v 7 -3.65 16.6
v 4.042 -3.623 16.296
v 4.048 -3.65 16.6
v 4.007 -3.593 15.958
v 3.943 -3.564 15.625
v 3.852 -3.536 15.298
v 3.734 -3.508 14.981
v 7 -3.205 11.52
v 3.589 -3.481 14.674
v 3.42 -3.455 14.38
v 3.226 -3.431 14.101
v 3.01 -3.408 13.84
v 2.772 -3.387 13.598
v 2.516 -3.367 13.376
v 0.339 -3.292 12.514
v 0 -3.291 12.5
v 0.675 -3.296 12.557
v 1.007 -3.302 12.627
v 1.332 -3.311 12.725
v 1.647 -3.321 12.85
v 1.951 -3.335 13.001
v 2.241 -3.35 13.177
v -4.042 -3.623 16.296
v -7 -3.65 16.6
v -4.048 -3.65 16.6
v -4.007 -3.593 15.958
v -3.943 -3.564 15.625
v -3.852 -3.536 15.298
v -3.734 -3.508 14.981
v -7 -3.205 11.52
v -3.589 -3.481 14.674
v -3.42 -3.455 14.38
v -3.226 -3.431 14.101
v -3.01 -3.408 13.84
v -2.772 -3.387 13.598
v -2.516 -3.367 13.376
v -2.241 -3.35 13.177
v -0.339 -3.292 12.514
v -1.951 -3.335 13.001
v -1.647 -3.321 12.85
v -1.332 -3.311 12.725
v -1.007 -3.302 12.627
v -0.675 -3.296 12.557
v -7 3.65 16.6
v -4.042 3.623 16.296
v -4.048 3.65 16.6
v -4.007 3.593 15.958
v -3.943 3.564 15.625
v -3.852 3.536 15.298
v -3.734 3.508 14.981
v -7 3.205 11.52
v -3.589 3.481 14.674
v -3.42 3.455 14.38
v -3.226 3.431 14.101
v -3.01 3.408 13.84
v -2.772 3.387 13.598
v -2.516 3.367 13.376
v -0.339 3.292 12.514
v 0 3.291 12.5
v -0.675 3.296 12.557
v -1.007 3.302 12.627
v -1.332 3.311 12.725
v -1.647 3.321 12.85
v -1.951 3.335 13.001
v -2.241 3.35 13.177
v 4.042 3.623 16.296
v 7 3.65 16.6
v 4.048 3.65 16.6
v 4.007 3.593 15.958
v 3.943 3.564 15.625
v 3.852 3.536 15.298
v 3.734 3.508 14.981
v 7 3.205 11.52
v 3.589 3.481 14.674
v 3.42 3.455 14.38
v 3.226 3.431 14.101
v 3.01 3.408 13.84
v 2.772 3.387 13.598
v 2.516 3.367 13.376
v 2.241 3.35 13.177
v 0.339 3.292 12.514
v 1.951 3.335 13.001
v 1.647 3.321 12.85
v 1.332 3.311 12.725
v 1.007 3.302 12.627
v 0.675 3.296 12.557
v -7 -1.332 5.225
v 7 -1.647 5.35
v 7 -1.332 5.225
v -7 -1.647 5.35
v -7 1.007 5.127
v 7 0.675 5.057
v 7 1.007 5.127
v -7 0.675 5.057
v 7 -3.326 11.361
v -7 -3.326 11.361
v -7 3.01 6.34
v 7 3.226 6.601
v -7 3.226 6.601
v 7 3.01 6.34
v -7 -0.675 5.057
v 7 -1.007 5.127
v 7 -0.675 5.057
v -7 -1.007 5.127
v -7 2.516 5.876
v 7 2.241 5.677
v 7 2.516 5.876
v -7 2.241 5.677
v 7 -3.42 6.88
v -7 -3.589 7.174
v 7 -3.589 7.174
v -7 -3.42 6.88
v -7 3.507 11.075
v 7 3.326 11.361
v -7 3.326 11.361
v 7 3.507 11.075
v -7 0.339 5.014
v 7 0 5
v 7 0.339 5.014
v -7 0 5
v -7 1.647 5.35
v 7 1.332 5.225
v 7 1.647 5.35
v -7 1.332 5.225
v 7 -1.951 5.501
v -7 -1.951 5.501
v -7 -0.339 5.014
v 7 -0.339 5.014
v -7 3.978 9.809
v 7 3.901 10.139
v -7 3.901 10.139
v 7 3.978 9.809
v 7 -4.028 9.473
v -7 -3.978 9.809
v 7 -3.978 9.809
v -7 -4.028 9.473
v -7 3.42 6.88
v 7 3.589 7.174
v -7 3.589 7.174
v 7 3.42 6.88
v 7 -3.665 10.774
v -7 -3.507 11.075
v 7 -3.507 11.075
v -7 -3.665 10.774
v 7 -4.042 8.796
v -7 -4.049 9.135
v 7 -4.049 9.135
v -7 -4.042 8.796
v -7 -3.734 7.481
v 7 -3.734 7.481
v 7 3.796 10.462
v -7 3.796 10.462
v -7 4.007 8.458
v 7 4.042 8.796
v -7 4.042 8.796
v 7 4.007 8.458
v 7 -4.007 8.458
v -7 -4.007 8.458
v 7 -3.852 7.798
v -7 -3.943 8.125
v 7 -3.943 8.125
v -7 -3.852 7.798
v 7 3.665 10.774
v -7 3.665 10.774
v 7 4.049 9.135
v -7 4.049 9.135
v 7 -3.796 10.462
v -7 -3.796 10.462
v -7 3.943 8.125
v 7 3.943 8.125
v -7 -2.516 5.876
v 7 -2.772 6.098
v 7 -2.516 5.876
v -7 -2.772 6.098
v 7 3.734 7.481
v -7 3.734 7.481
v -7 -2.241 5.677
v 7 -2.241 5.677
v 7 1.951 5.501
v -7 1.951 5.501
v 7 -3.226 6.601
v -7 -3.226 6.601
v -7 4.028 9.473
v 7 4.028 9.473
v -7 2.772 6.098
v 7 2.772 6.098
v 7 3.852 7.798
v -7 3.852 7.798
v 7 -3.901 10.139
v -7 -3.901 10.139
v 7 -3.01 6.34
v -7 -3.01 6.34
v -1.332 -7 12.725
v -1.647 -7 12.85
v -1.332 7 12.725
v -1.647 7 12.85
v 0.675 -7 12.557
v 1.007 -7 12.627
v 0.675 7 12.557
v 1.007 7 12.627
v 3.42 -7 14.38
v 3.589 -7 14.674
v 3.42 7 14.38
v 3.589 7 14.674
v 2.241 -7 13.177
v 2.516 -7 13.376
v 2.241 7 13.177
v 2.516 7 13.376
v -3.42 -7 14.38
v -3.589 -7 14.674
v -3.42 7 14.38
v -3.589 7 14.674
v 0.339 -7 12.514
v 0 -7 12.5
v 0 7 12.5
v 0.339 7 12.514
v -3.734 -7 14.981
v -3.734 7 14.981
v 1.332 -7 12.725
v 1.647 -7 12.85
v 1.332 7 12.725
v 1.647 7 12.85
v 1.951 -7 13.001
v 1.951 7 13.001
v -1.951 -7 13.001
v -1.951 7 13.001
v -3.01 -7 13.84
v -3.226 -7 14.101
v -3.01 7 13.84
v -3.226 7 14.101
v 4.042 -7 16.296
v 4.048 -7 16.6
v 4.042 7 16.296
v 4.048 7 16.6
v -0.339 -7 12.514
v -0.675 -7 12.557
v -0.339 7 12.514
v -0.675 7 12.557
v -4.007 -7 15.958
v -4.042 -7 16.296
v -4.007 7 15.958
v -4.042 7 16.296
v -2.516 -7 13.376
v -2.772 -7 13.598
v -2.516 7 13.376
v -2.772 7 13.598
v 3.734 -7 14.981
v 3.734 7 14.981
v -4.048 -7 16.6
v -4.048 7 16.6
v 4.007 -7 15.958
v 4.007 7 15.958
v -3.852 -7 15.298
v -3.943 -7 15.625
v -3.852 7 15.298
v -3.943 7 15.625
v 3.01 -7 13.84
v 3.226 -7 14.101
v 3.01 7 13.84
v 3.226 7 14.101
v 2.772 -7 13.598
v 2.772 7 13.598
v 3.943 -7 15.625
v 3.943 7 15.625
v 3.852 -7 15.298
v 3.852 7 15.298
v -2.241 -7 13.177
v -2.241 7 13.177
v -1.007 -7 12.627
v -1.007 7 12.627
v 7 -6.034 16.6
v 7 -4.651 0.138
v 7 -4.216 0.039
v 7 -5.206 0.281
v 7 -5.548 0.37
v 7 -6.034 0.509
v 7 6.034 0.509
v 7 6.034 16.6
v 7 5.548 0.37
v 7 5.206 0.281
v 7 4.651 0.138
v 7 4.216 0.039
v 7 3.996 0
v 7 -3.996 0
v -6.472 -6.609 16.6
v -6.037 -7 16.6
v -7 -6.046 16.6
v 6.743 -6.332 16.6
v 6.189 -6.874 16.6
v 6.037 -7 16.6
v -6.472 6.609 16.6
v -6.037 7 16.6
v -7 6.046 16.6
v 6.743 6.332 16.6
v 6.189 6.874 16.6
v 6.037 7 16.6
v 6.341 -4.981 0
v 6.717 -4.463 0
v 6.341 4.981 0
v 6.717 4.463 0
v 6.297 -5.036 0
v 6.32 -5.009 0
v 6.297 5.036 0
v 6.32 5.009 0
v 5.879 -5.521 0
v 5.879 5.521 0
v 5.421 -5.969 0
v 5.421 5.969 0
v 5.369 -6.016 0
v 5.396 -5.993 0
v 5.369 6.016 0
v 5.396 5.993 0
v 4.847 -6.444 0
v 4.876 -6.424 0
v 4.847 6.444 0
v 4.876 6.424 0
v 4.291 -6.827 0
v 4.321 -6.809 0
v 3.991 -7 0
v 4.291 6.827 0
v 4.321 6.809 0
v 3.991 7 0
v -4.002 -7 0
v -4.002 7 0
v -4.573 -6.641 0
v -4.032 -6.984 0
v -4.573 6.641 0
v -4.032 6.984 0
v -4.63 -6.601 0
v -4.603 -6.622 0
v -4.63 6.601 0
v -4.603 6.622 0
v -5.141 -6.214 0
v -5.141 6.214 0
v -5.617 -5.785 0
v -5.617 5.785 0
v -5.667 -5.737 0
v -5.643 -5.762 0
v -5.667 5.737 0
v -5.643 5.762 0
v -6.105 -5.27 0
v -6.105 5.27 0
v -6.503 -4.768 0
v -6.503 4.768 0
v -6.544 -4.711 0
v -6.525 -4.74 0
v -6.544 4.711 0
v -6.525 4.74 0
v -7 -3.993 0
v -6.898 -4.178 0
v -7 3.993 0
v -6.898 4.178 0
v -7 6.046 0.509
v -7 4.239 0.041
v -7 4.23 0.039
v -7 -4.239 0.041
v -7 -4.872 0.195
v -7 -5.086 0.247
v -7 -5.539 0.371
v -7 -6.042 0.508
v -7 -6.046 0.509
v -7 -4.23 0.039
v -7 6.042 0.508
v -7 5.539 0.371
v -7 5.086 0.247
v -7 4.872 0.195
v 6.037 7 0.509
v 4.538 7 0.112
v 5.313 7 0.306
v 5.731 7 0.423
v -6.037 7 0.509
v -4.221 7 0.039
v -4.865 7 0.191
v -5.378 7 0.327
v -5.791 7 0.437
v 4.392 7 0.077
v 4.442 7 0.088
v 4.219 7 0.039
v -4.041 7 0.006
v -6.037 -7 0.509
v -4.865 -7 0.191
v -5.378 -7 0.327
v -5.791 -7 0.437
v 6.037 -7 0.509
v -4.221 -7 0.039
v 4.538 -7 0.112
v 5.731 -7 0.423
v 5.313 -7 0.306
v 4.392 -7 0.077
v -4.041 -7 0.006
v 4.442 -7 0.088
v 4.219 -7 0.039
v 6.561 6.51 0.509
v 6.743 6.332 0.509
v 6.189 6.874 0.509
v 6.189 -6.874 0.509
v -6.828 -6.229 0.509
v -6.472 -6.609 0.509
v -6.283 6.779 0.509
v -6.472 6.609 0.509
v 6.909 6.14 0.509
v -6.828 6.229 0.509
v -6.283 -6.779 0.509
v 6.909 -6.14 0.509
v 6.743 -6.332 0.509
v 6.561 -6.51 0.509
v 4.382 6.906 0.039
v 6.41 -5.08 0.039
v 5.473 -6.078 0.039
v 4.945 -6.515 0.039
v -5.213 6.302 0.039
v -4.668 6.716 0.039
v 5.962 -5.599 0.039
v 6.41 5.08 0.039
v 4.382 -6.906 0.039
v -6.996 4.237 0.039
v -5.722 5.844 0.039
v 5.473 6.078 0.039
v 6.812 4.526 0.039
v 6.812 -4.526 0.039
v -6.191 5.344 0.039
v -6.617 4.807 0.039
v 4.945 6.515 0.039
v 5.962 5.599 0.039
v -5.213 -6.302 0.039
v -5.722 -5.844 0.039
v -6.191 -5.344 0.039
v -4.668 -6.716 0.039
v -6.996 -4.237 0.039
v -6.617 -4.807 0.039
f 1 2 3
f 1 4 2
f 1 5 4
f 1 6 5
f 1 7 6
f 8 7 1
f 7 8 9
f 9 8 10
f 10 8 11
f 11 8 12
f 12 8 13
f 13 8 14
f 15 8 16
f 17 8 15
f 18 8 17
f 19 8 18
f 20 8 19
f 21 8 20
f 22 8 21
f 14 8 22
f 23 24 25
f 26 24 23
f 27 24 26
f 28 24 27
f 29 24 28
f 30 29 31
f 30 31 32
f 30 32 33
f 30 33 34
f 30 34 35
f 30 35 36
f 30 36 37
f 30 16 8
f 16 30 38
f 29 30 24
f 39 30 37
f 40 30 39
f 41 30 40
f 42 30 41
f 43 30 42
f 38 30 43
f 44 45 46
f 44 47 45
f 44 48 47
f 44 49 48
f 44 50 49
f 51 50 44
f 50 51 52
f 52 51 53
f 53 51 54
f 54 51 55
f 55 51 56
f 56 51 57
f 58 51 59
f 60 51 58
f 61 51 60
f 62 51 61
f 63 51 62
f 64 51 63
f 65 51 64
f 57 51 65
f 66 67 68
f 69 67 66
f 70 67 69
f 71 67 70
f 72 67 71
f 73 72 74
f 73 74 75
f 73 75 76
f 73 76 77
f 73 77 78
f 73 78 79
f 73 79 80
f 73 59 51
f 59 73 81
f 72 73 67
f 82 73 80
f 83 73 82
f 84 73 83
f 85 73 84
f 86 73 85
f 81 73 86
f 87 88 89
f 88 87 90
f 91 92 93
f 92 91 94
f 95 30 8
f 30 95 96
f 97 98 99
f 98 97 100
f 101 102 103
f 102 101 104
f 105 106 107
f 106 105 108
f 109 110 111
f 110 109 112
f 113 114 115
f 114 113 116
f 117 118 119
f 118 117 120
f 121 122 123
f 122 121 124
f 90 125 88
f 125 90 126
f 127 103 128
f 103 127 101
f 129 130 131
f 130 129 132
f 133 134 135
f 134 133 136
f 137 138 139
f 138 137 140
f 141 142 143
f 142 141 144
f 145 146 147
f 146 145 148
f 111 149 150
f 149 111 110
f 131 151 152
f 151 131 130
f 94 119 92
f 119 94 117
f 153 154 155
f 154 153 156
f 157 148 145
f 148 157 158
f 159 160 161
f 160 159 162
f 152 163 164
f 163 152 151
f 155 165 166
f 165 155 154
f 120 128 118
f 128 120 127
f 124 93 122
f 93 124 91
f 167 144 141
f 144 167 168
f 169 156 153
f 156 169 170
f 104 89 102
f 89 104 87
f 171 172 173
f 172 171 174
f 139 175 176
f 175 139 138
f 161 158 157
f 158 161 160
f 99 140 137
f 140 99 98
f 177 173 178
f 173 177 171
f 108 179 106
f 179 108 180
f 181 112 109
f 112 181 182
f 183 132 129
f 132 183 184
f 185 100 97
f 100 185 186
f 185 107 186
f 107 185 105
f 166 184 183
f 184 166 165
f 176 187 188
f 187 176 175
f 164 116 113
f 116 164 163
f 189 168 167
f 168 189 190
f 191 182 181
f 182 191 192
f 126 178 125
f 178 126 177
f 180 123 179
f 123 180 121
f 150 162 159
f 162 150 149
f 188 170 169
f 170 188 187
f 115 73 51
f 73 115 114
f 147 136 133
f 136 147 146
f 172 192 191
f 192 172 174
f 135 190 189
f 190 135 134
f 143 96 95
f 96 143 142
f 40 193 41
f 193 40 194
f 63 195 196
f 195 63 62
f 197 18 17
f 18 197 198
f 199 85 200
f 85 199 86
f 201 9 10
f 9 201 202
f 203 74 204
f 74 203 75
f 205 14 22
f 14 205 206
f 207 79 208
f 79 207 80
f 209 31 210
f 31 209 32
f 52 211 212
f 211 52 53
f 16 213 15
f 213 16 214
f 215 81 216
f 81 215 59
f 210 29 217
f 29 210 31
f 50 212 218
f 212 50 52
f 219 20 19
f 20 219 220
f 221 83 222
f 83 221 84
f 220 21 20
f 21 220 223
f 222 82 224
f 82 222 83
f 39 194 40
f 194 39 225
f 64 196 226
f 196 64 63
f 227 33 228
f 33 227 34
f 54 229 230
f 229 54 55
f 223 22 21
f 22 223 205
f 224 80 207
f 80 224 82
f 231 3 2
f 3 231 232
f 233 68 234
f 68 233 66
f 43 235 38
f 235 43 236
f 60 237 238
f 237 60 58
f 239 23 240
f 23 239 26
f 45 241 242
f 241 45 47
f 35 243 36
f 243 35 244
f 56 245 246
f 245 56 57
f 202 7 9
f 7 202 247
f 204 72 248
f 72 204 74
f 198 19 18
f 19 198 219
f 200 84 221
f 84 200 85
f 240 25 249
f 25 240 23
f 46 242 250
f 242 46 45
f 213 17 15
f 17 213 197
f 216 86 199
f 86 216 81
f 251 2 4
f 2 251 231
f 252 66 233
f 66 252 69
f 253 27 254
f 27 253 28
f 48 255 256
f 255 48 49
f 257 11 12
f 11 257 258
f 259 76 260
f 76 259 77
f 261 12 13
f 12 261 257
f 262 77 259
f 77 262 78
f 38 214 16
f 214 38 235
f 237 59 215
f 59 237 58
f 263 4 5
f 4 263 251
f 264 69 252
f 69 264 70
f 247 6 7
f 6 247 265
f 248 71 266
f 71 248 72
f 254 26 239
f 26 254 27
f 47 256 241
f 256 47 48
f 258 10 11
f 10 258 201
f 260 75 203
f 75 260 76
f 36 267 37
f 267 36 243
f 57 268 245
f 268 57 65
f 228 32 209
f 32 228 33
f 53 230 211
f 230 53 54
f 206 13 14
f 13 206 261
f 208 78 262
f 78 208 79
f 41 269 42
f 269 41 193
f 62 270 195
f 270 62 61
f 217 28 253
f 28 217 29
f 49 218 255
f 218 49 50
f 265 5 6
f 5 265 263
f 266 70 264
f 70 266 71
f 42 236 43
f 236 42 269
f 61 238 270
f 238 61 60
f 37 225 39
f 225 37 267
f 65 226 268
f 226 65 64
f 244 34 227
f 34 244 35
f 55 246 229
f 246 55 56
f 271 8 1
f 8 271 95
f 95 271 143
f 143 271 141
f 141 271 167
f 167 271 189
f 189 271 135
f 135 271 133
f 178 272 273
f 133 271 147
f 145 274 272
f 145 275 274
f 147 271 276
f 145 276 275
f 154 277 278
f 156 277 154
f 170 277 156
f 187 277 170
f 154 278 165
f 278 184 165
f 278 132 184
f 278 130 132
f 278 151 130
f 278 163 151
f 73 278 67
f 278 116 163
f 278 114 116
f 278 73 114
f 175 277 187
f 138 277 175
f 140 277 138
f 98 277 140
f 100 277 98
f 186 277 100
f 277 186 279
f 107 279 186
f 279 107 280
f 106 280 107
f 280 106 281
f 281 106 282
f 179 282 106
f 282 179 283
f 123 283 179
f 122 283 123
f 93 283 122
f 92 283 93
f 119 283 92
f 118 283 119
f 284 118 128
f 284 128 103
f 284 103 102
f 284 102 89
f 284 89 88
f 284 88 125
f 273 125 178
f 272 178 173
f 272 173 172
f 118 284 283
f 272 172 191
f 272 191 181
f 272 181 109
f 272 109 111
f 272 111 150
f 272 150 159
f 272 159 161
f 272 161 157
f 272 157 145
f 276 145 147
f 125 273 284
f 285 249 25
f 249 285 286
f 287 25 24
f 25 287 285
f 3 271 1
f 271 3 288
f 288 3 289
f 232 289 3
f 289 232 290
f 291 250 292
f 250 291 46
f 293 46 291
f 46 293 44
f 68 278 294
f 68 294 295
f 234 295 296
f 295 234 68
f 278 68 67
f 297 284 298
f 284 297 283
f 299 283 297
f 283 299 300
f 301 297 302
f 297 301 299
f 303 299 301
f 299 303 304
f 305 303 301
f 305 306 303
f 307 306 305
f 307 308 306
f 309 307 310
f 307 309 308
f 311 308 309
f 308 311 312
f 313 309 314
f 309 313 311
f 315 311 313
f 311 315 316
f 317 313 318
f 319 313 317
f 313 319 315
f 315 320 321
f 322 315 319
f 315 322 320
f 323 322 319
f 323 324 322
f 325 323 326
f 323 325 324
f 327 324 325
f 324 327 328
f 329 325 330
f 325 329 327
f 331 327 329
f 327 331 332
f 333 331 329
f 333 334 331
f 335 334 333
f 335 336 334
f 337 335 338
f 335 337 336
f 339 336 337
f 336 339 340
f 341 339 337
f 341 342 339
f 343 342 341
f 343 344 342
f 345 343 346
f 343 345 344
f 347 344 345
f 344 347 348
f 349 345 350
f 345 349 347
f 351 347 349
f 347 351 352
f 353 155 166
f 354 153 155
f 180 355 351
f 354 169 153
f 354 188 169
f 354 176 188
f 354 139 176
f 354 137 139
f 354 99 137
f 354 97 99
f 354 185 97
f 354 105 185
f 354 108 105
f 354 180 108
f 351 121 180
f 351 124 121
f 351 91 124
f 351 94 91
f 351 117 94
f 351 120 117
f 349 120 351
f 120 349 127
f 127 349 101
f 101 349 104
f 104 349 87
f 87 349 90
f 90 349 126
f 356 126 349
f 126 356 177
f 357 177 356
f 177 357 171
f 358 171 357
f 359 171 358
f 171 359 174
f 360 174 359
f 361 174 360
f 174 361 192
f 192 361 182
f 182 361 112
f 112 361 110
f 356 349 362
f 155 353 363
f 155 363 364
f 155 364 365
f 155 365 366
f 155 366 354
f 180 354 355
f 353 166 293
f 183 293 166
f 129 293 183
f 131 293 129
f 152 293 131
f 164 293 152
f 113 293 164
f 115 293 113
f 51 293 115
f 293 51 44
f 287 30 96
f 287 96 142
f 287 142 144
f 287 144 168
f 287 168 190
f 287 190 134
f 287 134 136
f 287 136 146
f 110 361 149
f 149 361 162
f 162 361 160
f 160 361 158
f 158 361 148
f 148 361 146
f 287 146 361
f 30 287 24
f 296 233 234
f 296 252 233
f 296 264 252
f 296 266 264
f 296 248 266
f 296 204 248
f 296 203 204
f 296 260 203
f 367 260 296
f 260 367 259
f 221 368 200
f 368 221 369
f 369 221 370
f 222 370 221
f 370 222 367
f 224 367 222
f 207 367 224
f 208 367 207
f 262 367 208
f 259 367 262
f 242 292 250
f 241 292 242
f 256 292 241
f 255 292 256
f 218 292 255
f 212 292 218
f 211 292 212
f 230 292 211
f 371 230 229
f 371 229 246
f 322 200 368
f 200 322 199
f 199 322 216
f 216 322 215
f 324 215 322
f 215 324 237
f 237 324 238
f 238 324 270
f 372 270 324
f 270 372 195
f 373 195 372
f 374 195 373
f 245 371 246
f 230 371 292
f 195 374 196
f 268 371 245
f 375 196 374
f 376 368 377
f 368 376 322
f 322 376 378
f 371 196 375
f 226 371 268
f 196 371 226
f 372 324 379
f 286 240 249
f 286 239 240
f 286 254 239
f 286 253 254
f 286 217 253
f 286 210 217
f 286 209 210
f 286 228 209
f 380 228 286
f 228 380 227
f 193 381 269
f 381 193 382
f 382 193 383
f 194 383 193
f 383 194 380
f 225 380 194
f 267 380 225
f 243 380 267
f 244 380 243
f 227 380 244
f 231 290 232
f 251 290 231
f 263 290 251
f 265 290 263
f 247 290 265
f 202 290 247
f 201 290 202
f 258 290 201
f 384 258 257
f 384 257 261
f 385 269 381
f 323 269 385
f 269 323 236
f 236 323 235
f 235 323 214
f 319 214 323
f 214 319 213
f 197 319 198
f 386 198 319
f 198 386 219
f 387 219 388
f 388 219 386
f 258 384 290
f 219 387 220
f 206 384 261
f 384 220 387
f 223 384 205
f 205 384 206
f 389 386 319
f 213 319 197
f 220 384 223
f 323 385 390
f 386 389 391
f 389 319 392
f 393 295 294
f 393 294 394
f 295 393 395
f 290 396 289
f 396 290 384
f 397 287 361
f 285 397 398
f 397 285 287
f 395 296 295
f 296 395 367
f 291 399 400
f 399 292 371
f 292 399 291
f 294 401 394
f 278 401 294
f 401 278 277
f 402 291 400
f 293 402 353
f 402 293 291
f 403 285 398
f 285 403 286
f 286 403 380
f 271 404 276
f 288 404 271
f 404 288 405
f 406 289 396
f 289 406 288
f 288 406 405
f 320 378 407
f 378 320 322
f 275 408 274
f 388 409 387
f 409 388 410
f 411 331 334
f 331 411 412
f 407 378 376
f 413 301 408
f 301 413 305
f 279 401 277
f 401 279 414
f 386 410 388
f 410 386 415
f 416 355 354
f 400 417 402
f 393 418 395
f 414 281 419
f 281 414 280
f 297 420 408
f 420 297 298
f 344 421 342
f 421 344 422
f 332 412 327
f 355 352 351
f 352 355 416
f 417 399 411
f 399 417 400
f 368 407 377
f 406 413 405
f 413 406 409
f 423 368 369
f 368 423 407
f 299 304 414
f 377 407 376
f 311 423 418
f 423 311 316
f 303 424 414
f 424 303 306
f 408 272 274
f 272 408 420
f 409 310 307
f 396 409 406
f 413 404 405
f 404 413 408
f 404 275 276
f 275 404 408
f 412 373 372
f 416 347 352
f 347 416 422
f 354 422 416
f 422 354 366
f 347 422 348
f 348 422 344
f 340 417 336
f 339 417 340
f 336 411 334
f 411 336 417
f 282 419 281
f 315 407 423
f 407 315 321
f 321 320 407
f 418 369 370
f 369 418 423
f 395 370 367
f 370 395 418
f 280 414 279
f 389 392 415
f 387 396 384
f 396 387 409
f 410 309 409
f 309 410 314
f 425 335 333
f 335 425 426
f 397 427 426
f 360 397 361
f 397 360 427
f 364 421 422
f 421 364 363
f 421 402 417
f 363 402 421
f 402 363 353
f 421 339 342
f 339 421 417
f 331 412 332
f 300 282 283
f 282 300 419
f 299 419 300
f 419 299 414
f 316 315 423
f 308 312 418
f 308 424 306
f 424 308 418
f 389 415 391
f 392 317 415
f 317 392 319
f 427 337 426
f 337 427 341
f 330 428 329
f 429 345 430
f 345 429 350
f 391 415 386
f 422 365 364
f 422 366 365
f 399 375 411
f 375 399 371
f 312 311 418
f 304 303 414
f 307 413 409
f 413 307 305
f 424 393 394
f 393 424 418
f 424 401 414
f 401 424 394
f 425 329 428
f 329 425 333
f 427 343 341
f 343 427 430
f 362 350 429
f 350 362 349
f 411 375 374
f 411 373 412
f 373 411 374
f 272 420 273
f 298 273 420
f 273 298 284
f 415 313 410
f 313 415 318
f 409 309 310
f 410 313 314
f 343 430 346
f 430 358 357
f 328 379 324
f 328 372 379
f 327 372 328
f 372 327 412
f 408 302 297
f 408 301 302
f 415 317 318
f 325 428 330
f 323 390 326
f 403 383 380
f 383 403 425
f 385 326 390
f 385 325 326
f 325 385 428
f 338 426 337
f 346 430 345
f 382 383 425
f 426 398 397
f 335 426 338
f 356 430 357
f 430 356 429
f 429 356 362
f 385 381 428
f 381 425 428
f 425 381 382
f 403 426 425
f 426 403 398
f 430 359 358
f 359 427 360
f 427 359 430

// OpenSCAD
$fn=75;

$width=14;
$depth=14;
$height=16.6;

module body() {
    translate([-($width/2),-($depth/2),0]) {
        cube([$width,$depth,$height]);
    }
}

module holes() {
    $diameter=8.1;
    $radius=$diameter/2;

    module lowerHole() {
        $offset=5;
        
        translate([-$width,0,$offset+$radius]) {
            rotate([0,90,0]) {
                    cylinder(d=8.1, h=$width*2);
            }
        }
    }

    module upperHole() {
        $offset=12.5;
        
        translate([0,$depth,$offset+$radius]) {
            rotate([90,90,0]) {
                    cylinder(d=$diameter, h=$depth*2);
            }
        }
    }
    
    module gap() {
        translate([0,-1,15]) {
            rotate([5,0,0]) {
                cube([$width*2,5,10], center=true);
            }
        }
        translate([0,1,15]) {
            rotate([-5,0,0]) {
                cube([$width*2,5,10], center=true);
            }
        }
    }
    
    union() {
        lowerHole();
        upperHole();
        gap();
    }
}


intersection() {
    difference() {
        body();
        holes();
    }
    cylinder(h=$height, d=18.5);
    translate([0,0,21]) {
        sphere(h=100,d=45);
    }
}
